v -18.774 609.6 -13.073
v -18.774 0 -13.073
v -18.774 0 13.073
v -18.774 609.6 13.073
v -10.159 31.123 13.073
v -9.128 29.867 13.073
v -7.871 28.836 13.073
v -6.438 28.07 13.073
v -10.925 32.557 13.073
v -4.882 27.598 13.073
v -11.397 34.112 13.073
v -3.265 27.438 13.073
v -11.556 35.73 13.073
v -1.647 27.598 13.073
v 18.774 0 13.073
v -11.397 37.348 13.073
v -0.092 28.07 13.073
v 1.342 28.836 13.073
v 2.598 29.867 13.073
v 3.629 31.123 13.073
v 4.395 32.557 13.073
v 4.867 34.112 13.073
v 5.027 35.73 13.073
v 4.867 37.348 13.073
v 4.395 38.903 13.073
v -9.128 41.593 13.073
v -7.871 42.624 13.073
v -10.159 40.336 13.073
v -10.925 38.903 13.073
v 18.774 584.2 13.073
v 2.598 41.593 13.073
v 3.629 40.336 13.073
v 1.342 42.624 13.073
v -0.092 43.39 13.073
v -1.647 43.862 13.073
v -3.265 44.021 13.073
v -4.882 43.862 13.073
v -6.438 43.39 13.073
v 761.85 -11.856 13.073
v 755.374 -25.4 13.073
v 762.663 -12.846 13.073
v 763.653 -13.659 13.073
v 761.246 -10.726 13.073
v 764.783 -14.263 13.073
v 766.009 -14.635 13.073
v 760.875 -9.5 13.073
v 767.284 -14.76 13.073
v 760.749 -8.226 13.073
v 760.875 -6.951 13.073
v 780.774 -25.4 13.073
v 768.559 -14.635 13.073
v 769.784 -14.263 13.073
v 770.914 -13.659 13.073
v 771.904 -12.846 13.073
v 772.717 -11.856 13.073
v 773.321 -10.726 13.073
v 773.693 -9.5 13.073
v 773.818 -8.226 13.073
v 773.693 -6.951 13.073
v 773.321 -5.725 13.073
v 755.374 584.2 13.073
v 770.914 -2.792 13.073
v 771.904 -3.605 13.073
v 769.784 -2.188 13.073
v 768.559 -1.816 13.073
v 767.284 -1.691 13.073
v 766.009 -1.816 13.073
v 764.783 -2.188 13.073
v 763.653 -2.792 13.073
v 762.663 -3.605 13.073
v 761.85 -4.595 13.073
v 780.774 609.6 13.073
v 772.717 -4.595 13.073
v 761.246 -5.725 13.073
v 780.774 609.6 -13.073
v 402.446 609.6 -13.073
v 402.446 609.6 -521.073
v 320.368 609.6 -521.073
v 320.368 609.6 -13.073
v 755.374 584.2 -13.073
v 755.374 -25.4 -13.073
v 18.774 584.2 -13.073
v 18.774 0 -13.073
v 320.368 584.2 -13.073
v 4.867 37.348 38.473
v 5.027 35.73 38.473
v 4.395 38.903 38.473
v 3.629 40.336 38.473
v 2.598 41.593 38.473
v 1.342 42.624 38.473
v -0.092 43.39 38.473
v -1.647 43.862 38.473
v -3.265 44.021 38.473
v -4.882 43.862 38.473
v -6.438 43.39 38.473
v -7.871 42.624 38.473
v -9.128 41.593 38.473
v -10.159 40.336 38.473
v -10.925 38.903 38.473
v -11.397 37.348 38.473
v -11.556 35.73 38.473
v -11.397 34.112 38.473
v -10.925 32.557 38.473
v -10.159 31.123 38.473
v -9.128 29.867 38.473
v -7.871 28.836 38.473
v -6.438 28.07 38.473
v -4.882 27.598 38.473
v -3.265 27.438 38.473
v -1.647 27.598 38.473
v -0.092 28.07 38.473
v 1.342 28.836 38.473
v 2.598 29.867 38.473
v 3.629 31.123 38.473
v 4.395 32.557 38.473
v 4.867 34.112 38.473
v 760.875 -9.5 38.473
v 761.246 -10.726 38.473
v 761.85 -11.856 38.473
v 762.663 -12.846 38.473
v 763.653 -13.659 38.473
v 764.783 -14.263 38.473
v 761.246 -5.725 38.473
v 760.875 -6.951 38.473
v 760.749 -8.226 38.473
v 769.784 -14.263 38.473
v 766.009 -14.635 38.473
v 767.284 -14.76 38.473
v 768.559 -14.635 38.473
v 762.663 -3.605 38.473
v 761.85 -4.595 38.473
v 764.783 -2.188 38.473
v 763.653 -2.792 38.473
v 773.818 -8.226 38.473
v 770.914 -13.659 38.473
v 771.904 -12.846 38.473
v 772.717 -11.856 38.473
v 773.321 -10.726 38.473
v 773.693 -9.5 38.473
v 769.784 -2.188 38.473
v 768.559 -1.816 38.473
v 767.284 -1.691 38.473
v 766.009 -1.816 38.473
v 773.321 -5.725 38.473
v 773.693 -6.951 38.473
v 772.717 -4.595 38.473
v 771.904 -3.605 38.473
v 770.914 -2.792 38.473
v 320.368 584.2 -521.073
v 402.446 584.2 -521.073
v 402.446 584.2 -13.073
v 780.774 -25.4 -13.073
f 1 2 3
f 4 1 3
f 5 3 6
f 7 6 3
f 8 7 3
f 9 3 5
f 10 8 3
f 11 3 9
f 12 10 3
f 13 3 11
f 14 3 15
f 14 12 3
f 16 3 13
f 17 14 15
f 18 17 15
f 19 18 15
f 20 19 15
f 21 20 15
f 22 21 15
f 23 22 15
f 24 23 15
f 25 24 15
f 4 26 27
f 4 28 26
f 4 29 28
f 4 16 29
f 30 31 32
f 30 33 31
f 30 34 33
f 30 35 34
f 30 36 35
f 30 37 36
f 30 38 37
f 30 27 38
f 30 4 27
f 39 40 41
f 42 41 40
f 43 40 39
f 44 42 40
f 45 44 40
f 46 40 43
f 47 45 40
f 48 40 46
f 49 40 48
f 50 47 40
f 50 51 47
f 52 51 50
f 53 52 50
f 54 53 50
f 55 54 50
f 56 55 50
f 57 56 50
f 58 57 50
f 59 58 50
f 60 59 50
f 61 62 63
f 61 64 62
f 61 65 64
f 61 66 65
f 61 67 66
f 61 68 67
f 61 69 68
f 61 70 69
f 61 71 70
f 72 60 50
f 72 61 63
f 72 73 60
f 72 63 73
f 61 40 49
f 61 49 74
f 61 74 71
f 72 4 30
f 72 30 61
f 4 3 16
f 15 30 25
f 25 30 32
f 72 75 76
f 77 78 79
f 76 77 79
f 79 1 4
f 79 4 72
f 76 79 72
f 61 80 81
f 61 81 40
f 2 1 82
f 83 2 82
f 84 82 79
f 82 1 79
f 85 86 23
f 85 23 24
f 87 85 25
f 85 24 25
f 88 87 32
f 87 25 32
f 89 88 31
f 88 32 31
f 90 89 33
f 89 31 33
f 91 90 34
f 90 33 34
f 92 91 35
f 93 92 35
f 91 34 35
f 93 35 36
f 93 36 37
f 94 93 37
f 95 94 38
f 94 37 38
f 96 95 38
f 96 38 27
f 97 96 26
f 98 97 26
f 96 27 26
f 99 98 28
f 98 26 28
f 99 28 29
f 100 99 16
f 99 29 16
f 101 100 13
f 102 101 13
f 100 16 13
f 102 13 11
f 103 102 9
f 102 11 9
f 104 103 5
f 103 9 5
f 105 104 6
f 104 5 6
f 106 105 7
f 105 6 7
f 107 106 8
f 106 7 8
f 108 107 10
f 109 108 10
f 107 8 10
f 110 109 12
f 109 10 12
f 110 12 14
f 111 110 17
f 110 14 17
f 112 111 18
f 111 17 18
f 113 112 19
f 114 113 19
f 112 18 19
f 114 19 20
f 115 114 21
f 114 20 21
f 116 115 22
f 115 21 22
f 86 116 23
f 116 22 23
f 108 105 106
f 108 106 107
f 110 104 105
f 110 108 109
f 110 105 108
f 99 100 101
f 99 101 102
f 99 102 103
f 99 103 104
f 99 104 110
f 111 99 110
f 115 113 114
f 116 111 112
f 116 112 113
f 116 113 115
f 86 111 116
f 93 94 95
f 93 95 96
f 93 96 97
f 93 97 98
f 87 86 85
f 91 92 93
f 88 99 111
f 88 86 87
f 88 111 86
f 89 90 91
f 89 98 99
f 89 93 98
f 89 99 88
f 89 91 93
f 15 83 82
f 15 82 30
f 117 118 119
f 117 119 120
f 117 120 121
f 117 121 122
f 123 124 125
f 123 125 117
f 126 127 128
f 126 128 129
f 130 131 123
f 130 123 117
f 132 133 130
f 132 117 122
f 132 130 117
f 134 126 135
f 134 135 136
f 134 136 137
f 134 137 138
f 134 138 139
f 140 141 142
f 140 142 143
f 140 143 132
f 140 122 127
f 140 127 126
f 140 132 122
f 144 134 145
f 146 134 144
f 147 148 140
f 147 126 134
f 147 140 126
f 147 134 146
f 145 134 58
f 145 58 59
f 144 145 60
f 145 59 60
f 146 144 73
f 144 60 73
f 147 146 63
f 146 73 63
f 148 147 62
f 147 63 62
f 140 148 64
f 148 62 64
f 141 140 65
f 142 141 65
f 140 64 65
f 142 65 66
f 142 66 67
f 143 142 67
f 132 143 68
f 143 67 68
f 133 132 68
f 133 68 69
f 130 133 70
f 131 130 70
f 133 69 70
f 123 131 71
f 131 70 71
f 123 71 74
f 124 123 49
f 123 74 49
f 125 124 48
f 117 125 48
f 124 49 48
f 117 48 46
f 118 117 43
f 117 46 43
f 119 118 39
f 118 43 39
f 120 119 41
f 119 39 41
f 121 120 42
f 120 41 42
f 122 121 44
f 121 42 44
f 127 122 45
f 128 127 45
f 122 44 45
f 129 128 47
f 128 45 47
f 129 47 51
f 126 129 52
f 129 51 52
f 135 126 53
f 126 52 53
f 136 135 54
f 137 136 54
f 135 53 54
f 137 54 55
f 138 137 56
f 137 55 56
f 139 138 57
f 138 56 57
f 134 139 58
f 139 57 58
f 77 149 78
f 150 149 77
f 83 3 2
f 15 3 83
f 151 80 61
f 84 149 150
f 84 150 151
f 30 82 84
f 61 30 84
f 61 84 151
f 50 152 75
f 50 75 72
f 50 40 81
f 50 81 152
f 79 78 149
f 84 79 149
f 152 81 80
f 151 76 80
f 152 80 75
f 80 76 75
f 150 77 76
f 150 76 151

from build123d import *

# Parameters (mm, degrees)
F0_W      = 37.547688
F0_H      = 26.145774
F1_DEPTH  = 609.6
F2_W      = 25.4
F2_H      = 26.145774
F3_DEPTH  = 762
F4_W      = 25.4
F4_H      = 26.145774
F5_DEPTH  = 609.6
F6_W      = 82.078397
F6_H      = 25.4
F7_DEPTH  = 508
F8_R      = 8.291485
F9_DEPTH  = 25.4
F10_R     = 6.534669
F11_DEPTH = 25.4


with BuildPart() as f1:
    # F0 (on Front) → F1 (new body)
    with BuildSketch(Plane.XZ):
        Rectangle(F0_W, F0_H)
    extrude(amount=-F1_DEPTH)

    # F2 (on face) → F3 (join)
    with BuildSketch(Plane.YZ.offset(18.773844)):
        with Locations((596.9, 0)):
            Rectangle(F2_W, F2_H)
    extrude(amount=F3_DEPTH)

    # F4 (on face) → F5 (join)
    with BuildSketch(Plane.XZ.offset(-584.2)):
        with Locations((768.073844, 0)):
            Rectangle(F4_W, F4_H)
    extrude(amount=F5_DEPTH)

    # F6 (on face) → F7 (join)
    with BuildSketch(Plane(origin=(0, 0, -13.072887), x_dir=(1, 0, 0), z_dir=(0, 0, -1))):
        with Locations((361.406744, -596.9)):
            Rectangle(F6_W, F6_H)
    extrude(amount=F7_DEPTH)

    # F8 (on face) → F9 (join)
    with BuildSketch(Plane.XY.offset(13.072887)):
        with Locations((-3.264897, 35.729956)):
            Circle(F8_R)
    extrude(amount=F9_DEPTH)

    # F10 (on face) → F11 (join)
    with BuildSketch(Plane.XY.offset(13.072887)):
        with Locations((767.283738, -8.2256)):
            Circle(F10_R)
    extrude(amount=F11_DEPTH)


solid = f1.part
